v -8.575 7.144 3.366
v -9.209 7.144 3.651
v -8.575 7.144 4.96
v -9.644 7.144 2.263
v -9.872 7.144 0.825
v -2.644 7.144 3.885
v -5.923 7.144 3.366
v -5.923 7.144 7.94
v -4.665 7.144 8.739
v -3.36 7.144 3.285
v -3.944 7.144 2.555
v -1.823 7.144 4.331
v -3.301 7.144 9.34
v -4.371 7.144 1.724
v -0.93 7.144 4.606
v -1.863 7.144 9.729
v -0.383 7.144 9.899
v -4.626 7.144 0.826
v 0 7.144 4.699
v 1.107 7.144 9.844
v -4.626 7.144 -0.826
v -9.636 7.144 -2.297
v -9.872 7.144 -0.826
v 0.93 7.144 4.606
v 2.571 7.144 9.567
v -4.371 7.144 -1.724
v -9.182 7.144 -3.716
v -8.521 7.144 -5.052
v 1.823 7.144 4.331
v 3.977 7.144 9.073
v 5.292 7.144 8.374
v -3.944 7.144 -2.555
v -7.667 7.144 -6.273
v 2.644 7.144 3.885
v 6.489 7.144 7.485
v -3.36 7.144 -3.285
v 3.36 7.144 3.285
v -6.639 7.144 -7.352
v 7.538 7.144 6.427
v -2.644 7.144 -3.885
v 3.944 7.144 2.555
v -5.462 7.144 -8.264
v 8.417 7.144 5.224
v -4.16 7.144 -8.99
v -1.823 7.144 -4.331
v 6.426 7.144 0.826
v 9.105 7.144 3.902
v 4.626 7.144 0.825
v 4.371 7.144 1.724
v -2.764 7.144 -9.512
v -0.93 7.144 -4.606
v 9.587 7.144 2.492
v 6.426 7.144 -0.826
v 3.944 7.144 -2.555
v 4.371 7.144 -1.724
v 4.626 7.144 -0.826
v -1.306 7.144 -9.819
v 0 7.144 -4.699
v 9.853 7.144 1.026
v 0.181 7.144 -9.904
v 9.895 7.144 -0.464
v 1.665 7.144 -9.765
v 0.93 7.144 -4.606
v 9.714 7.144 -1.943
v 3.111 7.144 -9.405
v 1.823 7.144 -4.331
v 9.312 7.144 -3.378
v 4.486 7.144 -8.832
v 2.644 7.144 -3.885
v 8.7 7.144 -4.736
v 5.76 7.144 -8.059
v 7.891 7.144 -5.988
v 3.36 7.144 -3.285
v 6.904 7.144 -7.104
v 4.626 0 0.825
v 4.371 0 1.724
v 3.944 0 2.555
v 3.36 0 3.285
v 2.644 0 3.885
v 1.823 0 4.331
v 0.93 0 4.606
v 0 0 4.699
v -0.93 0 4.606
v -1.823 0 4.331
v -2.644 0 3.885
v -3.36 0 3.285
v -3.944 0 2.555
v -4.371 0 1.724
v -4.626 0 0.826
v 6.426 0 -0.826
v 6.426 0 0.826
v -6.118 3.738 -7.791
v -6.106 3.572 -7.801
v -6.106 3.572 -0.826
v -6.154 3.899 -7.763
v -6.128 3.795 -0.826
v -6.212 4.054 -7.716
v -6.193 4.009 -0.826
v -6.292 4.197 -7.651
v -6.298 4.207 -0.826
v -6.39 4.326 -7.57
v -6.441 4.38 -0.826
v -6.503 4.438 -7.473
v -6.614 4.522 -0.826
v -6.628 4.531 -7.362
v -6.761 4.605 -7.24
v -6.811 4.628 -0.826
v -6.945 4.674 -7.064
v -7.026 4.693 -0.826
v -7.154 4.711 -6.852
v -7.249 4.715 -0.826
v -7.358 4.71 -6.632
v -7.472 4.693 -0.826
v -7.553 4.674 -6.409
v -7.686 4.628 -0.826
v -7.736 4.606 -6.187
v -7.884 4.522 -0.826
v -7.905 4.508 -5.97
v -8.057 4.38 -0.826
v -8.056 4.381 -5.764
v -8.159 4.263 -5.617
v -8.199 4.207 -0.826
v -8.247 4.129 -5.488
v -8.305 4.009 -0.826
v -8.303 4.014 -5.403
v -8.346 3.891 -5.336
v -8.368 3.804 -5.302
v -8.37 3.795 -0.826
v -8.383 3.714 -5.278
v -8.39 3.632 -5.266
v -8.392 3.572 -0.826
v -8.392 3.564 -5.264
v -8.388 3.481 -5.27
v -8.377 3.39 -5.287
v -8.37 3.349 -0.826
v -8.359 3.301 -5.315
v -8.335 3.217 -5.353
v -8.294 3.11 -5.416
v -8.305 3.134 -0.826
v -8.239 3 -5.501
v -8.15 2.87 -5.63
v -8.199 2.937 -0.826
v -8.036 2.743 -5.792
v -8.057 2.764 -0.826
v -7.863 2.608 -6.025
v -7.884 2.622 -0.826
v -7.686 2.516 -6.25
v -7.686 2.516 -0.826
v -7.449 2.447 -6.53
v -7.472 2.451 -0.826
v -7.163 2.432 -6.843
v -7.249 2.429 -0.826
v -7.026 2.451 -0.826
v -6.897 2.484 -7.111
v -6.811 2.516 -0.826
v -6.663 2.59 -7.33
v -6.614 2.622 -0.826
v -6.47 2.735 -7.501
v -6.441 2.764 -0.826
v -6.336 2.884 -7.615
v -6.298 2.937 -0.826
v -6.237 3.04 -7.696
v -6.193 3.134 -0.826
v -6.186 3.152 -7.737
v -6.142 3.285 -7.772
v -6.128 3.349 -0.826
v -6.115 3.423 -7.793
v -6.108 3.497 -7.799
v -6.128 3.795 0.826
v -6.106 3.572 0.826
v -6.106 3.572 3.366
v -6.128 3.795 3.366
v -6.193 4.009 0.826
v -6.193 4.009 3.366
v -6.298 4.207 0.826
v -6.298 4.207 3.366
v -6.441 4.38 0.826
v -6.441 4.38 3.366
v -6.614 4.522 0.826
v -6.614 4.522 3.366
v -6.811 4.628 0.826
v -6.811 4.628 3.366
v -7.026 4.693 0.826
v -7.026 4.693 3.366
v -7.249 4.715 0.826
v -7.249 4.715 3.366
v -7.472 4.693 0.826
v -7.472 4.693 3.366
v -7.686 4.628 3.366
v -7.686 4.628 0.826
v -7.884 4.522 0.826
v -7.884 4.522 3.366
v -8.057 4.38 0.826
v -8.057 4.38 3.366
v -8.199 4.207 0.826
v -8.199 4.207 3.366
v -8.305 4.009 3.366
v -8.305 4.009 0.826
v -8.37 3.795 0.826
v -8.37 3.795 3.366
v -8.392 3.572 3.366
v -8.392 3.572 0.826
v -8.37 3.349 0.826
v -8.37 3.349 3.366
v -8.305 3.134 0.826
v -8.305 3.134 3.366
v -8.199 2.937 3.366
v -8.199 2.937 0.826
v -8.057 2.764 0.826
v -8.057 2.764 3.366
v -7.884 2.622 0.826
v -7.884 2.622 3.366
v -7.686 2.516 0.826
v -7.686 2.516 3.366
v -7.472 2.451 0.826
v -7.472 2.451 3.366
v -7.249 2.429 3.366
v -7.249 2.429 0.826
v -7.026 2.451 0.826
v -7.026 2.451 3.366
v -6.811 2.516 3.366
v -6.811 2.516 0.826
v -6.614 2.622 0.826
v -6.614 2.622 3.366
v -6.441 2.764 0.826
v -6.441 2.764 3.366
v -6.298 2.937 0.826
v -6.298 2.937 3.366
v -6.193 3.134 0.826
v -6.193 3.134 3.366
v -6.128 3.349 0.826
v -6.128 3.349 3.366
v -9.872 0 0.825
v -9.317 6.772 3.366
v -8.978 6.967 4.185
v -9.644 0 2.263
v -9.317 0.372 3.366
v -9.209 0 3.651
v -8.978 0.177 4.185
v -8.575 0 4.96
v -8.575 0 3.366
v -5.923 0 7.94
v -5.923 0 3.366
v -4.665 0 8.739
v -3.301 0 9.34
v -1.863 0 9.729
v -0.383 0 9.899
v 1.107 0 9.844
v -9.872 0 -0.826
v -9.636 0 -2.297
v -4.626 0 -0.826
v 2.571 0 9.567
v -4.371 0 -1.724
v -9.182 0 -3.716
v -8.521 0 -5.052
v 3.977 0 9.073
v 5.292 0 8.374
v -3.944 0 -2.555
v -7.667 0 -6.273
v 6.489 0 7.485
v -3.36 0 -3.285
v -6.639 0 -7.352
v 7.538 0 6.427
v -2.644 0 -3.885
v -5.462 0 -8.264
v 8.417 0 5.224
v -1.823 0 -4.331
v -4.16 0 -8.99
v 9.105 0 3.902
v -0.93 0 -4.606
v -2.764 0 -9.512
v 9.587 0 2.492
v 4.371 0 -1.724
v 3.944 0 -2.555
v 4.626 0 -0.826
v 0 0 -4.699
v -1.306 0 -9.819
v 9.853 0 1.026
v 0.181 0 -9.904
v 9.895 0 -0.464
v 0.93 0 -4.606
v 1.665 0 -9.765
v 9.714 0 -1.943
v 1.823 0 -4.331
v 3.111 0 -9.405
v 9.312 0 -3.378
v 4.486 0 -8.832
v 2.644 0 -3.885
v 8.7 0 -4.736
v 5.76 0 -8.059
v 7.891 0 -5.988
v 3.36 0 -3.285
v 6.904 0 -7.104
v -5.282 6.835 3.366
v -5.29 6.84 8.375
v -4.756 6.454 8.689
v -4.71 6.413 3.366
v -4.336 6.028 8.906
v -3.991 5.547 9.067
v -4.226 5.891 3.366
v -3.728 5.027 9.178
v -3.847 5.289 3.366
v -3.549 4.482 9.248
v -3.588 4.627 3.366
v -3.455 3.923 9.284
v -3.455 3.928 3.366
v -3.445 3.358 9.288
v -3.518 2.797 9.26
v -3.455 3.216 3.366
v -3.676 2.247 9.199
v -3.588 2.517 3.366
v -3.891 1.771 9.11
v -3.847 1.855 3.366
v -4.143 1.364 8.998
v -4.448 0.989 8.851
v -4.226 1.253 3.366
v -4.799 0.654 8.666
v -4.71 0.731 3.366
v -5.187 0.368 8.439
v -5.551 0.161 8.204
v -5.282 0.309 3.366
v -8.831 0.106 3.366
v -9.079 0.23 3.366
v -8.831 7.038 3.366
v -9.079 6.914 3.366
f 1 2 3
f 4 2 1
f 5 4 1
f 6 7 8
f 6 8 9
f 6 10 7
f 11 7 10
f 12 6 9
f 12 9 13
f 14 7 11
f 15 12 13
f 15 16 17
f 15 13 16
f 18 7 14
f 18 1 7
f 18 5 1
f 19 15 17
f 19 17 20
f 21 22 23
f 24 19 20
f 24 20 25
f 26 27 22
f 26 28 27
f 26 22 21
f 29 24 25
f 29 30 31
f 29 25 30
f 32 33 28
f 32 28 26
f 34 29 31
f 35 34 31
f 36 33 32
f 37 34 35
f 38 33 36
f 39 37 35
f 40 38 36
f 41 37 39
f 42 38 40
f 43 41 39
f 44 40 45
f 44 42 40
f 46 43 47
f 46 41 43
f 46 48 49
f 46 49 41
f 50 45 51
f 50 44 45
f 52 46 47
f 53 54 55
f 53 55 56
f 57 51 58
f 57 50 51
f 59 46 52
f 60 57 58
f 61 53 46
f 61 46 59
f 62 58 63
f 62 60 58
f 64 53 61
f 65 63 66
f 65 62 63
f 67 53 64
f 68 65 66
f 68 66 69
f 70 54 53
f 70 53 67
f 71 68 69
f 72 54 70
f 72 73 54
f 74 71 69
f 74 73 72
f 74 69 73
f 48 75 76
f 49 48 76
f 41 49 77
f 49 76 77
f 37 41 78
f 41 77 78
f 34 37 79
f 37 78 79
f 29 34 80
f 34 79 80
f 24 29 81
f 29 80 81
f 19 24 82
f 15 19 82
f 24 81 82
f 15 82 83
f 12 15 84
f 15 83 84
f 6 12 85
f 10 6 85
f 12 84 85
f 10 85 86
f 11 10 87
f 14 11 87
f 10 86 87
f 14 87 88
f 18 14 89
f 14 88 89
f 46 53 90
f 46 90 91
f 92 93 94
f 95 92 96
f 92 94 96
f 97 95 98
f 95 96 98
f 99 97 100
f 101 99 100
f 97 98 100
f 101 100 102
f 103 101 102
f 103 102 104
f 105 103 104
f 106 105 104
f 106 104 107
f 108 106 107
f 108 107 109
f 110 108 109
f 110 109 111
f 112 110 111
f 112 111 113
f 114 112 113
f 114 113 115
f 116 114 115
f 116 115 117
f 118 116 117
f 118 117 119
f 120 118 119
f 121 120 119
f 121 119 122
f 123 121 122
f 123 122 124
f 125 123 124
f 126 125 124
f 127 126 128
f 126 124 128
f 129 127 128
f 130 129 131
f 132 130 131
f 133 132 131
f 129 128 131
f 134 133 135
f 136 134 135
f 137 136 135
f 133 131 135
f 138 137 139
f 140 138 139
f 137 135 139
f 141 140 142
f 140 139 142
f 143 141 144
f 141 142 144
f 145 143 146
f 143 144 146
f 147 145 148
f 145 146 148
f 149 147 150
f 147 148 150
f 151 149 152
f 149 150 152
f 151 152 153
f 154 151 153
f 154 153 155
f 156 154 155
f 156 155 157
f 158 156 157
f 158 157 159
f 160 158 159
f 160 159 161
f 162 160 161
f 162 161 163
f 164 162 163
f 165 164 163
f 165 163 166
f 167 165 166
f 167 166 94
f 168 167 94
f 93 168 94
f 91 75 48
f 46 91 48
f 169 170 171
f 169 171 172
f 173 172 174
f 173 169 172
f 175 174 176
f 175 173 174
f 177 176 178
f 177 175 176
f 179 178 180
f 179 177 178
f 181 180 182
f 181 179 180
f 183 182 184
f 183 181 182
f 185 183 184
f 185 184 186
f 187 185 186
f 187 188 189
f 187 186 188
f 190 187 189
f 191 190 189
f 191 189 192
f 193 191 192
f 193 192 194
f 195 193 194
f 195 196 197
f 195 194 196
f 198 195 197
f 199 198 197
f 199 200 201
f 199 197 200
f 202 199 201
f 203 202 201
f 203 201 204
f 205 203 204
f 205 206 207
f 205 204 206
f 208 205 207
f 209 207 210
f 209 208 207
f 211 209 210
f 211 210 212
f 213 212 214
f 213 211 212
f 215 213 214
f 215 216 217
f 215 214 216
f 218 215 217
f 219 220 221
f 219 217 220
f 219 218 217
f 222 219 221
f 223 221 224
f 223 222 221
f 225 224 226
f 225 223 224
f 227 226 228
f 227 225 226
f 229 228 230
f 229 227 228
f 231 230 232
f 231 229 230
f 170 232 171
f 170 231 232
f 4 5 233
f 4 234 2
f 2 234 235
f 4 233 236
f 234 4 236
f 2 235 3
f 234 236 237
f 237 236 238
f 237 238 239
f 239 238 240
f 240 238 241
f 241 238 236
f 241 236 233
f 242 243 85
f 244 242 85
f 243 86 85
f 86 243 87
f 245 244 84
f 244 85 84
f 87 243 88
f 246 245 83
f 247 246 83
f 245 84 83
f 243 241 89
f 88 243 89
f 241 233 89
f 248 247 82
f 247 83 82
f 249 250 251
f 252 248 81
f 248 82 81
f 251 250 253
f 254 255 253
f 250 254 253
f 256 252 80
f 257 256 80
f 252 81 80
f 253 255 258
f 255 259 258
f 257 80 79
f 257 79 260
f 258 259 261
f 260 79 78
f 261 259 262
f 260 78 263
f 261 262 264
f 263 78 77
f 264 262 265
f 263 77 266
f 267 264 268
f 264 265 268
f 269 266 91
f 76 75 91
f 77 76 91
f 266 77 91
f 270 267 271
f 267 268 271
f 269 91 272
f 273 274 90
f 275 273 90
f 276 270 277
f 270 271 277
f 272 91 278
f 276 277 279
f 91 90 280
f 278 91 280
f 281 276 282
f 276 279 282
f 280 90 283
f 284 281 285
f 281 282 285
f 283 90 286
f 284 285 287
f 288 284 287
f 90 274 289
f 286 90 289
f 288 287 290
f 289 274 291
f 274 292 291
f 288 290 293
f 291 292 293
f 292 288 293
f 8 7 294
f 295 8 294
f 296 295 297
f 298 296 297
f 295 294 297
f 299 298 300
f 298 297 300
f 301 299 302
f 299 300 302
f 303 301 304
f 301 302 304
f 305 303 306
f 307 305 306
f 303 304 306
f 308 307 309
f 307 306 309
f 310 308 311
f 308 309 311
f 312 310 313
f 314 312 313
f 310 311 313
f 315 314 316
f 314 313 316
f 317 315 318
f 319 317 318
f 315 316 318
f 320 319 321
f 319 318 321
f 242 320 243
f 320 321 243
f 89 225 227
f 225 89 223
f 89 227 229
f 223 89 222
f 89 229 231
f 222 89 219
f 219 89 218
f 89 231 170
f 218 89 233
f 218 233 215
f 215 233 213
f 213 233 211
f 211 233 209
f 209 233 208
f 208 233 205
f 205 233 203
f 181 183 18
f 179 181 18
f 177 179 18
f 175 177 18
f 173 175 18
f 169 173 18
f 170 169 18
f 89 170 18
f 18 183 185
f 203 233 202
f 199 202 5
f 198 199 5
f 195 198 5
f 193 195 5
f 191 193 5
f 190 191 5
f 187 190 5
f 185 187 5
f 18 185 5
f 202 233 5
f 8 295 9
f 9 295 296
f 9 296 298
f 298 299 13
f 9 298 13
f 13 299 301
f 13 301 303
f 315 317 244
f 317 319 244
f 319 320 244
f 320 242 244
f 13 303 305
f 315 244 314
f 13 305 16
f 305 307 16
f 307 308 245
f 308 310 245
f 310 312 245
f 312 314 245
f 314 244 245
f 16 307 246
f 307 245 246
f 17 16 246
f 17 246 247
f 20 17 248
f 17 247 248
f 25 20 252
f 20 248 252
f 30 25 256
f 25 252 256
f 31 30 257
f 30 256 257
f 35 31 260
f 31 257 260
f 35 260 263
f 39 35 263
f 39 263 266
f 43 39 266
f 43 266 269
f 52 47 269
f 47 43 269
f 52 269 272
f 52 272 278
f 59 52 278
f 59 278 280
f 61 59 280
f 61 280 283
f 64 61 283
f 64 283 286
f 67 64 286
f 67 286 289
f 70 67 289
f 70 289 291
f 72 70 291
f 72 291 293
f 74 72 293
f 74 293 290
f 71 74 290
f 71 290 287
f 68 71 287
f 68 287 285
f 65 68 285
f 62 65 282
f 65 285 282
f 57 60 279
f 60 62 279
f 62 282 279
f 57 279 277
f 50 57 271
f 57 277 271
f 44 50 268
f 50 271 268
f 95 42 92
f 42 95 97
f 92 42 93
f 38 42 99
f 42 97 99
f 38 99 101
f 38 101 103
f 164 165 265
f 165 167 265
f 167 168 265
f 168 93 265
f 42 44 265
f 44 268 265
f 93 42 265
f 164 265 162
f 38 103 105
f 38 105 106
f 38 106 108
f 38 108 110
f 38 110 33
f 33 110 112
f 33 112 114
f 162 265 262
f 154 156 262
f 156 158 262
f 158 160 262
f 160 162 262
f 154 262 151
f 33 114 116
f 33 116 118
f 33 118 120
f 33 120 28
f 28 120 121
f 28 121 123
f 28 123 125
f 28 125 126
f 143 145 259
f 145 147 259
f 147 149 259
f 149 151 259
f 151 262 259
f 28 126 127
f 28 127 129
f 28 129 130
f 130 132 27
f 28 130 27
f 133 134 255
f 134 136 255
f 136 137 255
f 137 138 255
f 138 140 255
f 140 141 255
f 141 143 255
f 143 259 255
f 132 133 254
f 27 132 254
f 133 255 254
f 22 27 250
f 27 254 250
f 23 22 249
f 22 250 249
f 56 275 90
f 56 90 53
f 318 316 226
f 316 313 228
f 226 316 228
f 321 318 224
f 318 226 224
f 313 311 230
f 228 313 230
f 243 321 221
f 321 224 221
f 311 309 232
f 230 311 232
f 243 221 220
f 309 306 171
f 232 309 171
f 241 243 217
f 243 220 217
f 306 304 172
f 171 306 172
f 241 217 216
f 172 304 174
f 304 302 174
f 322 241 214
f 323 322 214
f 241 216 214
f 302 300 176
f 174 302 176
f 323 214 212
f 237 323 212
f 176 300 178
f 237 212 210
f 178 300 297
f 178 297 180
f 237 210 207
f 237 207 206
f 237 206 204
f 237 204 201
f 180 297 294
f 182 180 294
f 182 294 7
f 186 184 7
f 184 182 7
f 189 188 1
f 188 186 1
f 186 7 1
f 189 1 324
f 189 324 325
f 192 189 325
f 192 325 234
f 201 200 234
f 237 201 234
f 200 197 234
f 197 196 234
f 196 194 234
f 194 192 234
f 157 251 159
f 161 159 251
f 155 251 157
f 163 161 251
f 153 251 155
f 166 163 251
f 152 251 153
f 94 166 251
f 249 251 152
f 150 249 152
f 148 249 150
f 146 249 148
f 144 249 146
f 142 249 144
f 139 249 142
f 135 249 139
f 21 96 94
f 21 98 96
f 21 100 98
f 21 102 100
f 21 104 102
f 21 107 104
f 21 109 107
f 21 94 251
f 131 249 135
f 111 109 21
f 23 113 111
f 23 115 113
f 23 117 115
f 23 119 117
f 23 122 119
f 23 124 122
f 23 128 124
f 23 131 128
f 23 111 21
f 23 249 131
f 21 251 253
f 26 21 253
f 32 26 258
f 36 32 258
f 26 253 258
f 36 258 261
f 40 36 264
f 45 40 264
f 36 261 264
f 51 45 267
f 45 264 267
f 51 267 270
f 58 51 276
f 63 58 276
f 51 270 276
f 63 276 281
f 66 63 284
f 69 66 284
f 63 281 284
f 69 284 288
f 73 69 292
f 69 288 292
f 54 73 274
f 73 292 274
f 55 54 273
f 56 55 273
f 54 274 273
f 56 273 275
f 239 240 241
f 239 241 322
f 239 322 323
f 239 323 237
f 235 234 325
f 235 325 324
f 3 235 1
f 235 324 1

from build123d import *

# Parameters (mm, degrees)
SKETCH1_R               = 9.906
BOSS_EXTRUDE1_DEPTH     = 7.14375
SKETCH2_R               = 4.699
CUT_EXTRUDE1_DEPTH      = 8.14375
SKETCH5_W               = 1.651
SKETCH5_H               = 13.498105676
CUT_EXTRUDE3_DEPTH      = 16.3322
SKETCH6_R               = 1.143
CUT_EXTRUDE4_DEPTH      = 11.7315
CUT_EXTRUDE4_DEPTH_BACK = 10.0805
SKETCH8_R               = 3.81
CUT_EXTRUDE5_DEPTH      = 16.3322


with BuildPart() as part:
    # Sketch1 → Boss-Extrude1 (new body)
    with BuildSketch(Plane(origin=(0, 0, 0), x_dir=(1, 0, 0), z_dir=(0, 1, 0))):
        Circle(SKETCH1_R)
    extrude(amount=BOSS_EXTRUDE1_DEPTH)

    # Sketch2 → Cut-Extrude1 (cut, through all)
    with BuildSketch(Plane(origin=(0, 0, 0), x_dir=(-1, 0, 0), z_dir=(0, -1, 0))):
        Circle(SKETCH2_R)
    extrude(amount=-CUT_EXTRUDE1_DEPTH, mode=Mode.SUBTRACT)

    # Sketch5 → Cut-Extrude3 (cut)
    with BuildSketch(Plane.ZY.offset(9.906)):
        with Locations((0, 5.193192543)):
            Rectangle(SKETCH5_W, SKETCH5_H)
    extrude(amount=-CUT_EXTRUDE3_DEPTH, mode=Mode.SUBTRACT)

    # Sketch6 → Cut-Extrude4 (cut, two sides)
    with BuildSketch(Plane.XY.offset(-0.8255)) as cut_extrude4_sk:
        with Locations((-7.248732927, 3.571875)):
            Circle(SKETCH6_R)
    extrude(amount=CUT_EXTRUDE4_DEPTH, mode=Mode.SUBTRACT)
    extrude(cut_extrude4_sk.sketch, amount=-CUT_EXTRUDE4_DEPTH_BACK, mode=Mode.SUBTRACT)

    # Sketch8 → Cut-Extrude5 (cut)
    with BuildSketch(Plane(origin=(0, 0, 3.3655), x_dir=(-1, 0, 0), z_dir=(0, 0, -1))):
        with Locations((7.248732927, 3.571875)):
            Circle(SKETCH8_R)
    extrude(amount=-CUT_EXTRUDE5_DEPTH, mode=Mode.SUBTRACT)


solid = part.part
